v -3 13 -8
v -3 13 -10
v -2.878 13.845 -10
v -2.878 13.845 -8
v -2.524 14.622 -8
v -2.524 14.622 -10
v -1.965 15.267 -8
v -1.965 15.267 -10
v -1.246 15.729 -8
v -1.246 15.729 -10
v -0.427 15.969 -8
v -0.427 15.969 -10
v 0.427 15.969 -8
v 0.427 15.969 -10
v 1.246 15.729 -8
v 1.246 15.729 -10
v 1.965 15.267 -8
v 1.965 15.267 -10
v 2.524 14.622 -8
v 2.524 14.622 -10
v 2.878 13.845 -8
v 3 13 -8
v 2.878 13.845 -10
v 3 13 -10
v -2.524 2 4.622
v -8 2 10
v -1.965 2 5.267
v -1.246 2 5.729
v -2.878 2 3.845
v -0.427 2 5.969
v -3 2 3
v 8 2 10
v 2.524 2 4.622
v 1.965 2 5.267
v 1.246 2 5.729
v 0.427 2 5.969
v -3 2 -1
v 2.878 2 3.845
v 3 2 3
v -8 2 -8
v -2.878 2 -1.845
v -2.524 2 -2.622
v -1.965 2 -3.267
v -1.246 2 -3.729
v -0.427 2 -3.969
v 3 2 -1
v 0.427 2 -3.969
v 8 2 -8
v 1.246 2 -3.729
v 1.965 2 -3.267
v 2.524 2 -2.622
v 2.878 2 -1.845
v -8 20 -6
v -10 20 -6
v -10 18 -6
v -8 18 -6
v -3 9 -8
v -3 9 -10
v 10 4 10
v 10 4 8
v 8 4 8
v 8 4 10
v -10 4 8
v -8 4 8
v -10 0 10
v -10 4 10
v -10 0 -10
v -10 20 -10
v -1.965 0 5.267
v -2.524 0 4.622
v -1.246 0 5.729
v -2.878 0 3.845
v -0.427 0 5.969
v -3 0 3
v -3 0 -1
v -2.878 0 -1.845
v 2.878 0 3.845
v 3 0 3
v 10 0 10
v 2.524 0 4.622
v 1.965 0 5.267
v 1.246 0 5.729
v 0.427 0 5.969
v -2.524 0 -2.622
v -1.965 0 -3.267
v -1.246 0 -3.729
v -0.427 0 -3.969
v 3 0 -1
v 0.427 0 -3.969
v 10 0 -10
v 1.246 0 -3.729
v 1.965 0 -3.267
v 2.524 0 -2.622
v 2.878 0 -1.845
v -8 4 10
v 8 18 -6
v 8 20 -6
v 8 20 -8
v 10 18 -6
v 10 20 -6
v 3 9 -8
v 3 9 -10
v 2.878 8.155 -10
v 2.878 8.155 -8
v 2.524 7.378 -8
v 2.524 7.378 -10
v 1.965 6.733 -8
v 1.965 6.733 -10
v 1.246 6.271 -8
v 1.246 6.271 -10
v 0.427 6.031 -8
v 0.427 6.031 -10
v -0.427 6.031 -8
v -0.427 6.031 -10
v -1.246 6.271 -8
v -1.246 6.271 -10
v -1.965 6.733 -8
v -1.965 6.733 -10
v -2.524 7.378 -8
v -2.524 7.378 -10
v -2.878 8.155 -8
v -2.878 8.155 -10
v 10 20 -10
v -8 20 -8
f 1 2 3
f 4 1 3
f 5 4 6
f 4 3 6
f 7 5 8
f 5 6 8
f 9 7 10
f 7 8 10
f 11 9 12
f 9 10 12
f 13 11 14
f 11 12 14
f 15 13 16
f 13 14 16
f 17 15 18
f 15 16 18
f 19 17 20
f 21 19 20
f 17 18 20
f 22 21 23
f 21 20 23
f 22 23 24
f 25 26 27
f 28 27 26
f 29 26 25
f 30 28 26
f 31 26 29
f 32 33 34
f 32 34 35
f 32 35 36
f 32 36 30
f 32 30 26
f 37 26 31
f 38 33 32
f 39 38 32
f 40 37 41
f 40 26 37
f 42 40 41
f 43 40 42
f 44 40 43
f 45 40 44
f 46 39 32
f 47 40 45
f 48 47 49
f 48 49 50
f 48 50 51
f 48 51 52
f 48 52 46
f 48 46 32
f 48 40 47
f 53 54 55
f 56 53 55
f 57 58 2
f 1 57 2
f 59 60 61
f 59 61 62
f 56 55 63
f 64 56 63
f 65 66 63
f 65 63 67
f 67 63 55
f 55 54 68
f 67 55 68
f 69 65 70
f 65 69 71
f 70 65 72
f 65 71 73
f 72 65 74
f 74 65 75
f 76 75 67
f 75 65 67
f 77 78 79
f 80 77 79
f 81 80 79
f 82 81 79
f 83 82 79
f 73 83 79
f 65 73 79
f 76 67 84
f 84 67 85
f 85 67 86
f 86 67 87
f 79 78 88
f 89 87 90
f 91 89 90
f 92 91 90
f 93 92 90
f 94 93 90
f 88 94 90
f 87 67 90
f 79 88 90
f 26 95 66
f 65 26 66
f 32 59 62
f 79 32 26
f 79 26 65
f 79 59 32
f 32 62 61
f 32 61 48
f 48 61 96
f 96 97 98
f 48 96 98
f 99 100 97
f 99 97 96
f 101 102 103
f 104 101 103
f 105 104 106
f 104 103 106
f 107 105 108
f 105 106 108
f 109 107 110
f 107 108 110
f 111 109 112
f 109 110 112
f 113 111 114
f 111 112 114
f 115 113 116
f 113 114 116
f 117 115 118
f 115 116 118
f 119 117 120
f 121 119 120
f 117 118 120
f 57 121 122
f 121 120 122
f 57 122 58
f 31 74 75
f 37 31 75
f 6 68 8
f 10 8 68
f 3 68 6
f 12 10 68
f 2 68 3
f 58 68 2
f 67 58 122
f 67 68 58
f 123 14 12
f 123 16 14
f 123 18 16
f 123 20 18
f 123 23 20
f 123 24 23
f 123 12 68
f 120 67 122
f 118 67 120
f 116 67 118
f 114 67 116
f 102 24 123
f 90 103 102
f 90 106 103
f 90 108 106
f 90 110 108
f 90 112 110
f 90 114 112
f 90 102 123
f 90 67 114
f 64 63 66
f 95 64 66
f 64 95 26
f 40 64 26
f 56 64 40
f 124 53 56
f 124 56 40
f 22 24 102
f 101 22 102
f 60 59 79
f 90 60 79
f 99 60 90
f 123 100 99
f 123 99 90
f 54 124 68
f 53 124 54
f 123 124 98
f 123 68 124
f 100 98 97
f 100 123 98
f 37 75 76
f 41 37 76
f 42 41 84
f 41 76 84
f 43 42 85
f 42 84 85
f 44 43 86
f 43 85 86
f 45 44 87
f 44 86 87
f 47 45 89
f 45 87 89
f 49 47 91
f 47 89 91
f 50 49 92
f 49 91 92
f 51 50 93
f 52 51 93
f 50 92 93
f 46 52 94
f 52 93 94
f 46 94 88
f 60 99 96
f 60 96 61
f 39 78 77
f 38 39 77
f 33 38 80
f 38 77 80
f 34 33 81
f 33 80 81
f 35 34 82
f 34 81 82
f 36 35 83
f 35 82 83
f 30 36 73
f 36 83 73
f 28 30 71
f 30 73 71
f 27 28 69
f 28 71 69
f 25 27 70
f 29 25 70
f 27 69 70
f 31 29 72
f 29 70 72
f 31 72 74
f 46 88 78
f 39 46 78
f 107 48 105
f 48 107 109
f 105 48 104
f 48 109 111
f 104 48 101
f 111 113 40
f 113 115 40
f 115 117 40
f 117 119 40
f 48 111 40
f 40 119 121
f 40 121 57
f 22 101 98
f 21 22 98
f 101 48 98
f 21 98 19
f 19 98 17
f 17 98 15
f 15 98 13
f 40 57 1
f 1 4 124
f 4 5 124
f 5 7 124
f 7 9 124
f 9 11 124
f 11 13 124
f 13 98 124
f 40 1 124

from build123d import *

# Parameters (mm, degrees)
SKETCH2_W               = 20
SKETCH2_H               = 20
BOSS_EXTRUDE1_DEPTH     = 2
SKETCH4_W               = 20
SKETCH4_H               = 20
BOSS_EXTRUDE2_DEPTH     = 2
BOSS_EXTRUDE3_DEPTH     = 2
CUT_EXTRUDE1_DEPTH      = 23.891046285
CUT_EXTRUDE1_DEPTH_BACK = 23.891046285
CUT_EXTRUDE2_DEPTH      = 29.705400189
CUT_EXTRUDE2_DEPTH_BACK = 29.705400189


with BuildPart() as part:
    # Sketch2 → Boss-Extrude1 (new body)
    with BuildSketch(Plane(origin=(0, 0, 0), x_dir=(1, 0, 0), z_dir=(0, 1, 0))):
        Rectangle(SKETCH2_W, SKETCH2_H)
    extrude(amount=BOSS_EXTRUDE1_DEPTH)

    # Sketch4 → Boss-Extrude2 (add)
    with BuildSketch(Plane(origin=(0, 0, -10), x_dir=(-1, 0, 0), z_dir=(0, 0, -1))):
        with Locations((0, 10)):
            Rectangle(SKETCH4_W, SKETCH4_H)
    extrude(amount=-BOSS_EXTRUDE2_DEPTH)

    # Sketch5 → Boss-Extrude3 (add)
    with BuildSketch(Plane.ZY.offset(10)):
        Polygon((-6, 18), (8, 4), (10, 4), (10, 2), (-8, 2), (-8, 20), (-6, 20), align=None)
    boss_extrude3 = extrude(amount=-BOSS_EXTRUDE3_DEPTH)

    # Mirror1: Boss-Extrude3 across plane
    add(boss_extrude3.mirror(Plane(origin=(0, 0, 0), x_dir=(0, 0, 1), z_dir=(1, 0, 0))))

    # Sketch6 → Cut-Extrude1 (cut, two sides: drawn at the far end of the back side and taken through both)
    with BuildSketch(Plane(origin=(0, 2, 0), x_dir=(1, 0, 0), z_dir=(0, 1, 0)).offset(-CUT_EXTRUDE1_DEPTH_BACK)):
        with BuildLine():
            Line((3, 1), (3, -3))
            ThreePointArc((3, -3), (0, -6), (-3, -3))
            Line((-3, -3), (-3, 1))
            ThreePointArc((-3, 1), (0, 4), (3, 1))
        make_face()
    extrude(amount=CUT_EXTRUDE1_DEPTH + CUT_EXTRUDE1_DEPTH_BACK, mode=Mode.SUBTRACT)

    # Sketch7 → Cut-Extrude2 (cut, two sides: drawn at the far end of the back side and taken through both)
    with BuildSketch(Plane.XY.offset(-8).offset(-CUT_EXTRUDE2_DEPTH_BACK)):
        with BuildLine():
            Line((3, 13), (3, 9))
            ThreePointArc((3, 9), (0, 6), (-3, 9))
            Line((-3, 9), (-3, 13))
            ThreePointArc((-3, 13), (0, 16), (3, 13))
        make_face()
    extrude(amount=CUT_EXTRUDE2_DEPTH + CUT_EXTRUDE2_DEPTH_BACK, mode=Mode.SUBTRACT)


solid = part.part
